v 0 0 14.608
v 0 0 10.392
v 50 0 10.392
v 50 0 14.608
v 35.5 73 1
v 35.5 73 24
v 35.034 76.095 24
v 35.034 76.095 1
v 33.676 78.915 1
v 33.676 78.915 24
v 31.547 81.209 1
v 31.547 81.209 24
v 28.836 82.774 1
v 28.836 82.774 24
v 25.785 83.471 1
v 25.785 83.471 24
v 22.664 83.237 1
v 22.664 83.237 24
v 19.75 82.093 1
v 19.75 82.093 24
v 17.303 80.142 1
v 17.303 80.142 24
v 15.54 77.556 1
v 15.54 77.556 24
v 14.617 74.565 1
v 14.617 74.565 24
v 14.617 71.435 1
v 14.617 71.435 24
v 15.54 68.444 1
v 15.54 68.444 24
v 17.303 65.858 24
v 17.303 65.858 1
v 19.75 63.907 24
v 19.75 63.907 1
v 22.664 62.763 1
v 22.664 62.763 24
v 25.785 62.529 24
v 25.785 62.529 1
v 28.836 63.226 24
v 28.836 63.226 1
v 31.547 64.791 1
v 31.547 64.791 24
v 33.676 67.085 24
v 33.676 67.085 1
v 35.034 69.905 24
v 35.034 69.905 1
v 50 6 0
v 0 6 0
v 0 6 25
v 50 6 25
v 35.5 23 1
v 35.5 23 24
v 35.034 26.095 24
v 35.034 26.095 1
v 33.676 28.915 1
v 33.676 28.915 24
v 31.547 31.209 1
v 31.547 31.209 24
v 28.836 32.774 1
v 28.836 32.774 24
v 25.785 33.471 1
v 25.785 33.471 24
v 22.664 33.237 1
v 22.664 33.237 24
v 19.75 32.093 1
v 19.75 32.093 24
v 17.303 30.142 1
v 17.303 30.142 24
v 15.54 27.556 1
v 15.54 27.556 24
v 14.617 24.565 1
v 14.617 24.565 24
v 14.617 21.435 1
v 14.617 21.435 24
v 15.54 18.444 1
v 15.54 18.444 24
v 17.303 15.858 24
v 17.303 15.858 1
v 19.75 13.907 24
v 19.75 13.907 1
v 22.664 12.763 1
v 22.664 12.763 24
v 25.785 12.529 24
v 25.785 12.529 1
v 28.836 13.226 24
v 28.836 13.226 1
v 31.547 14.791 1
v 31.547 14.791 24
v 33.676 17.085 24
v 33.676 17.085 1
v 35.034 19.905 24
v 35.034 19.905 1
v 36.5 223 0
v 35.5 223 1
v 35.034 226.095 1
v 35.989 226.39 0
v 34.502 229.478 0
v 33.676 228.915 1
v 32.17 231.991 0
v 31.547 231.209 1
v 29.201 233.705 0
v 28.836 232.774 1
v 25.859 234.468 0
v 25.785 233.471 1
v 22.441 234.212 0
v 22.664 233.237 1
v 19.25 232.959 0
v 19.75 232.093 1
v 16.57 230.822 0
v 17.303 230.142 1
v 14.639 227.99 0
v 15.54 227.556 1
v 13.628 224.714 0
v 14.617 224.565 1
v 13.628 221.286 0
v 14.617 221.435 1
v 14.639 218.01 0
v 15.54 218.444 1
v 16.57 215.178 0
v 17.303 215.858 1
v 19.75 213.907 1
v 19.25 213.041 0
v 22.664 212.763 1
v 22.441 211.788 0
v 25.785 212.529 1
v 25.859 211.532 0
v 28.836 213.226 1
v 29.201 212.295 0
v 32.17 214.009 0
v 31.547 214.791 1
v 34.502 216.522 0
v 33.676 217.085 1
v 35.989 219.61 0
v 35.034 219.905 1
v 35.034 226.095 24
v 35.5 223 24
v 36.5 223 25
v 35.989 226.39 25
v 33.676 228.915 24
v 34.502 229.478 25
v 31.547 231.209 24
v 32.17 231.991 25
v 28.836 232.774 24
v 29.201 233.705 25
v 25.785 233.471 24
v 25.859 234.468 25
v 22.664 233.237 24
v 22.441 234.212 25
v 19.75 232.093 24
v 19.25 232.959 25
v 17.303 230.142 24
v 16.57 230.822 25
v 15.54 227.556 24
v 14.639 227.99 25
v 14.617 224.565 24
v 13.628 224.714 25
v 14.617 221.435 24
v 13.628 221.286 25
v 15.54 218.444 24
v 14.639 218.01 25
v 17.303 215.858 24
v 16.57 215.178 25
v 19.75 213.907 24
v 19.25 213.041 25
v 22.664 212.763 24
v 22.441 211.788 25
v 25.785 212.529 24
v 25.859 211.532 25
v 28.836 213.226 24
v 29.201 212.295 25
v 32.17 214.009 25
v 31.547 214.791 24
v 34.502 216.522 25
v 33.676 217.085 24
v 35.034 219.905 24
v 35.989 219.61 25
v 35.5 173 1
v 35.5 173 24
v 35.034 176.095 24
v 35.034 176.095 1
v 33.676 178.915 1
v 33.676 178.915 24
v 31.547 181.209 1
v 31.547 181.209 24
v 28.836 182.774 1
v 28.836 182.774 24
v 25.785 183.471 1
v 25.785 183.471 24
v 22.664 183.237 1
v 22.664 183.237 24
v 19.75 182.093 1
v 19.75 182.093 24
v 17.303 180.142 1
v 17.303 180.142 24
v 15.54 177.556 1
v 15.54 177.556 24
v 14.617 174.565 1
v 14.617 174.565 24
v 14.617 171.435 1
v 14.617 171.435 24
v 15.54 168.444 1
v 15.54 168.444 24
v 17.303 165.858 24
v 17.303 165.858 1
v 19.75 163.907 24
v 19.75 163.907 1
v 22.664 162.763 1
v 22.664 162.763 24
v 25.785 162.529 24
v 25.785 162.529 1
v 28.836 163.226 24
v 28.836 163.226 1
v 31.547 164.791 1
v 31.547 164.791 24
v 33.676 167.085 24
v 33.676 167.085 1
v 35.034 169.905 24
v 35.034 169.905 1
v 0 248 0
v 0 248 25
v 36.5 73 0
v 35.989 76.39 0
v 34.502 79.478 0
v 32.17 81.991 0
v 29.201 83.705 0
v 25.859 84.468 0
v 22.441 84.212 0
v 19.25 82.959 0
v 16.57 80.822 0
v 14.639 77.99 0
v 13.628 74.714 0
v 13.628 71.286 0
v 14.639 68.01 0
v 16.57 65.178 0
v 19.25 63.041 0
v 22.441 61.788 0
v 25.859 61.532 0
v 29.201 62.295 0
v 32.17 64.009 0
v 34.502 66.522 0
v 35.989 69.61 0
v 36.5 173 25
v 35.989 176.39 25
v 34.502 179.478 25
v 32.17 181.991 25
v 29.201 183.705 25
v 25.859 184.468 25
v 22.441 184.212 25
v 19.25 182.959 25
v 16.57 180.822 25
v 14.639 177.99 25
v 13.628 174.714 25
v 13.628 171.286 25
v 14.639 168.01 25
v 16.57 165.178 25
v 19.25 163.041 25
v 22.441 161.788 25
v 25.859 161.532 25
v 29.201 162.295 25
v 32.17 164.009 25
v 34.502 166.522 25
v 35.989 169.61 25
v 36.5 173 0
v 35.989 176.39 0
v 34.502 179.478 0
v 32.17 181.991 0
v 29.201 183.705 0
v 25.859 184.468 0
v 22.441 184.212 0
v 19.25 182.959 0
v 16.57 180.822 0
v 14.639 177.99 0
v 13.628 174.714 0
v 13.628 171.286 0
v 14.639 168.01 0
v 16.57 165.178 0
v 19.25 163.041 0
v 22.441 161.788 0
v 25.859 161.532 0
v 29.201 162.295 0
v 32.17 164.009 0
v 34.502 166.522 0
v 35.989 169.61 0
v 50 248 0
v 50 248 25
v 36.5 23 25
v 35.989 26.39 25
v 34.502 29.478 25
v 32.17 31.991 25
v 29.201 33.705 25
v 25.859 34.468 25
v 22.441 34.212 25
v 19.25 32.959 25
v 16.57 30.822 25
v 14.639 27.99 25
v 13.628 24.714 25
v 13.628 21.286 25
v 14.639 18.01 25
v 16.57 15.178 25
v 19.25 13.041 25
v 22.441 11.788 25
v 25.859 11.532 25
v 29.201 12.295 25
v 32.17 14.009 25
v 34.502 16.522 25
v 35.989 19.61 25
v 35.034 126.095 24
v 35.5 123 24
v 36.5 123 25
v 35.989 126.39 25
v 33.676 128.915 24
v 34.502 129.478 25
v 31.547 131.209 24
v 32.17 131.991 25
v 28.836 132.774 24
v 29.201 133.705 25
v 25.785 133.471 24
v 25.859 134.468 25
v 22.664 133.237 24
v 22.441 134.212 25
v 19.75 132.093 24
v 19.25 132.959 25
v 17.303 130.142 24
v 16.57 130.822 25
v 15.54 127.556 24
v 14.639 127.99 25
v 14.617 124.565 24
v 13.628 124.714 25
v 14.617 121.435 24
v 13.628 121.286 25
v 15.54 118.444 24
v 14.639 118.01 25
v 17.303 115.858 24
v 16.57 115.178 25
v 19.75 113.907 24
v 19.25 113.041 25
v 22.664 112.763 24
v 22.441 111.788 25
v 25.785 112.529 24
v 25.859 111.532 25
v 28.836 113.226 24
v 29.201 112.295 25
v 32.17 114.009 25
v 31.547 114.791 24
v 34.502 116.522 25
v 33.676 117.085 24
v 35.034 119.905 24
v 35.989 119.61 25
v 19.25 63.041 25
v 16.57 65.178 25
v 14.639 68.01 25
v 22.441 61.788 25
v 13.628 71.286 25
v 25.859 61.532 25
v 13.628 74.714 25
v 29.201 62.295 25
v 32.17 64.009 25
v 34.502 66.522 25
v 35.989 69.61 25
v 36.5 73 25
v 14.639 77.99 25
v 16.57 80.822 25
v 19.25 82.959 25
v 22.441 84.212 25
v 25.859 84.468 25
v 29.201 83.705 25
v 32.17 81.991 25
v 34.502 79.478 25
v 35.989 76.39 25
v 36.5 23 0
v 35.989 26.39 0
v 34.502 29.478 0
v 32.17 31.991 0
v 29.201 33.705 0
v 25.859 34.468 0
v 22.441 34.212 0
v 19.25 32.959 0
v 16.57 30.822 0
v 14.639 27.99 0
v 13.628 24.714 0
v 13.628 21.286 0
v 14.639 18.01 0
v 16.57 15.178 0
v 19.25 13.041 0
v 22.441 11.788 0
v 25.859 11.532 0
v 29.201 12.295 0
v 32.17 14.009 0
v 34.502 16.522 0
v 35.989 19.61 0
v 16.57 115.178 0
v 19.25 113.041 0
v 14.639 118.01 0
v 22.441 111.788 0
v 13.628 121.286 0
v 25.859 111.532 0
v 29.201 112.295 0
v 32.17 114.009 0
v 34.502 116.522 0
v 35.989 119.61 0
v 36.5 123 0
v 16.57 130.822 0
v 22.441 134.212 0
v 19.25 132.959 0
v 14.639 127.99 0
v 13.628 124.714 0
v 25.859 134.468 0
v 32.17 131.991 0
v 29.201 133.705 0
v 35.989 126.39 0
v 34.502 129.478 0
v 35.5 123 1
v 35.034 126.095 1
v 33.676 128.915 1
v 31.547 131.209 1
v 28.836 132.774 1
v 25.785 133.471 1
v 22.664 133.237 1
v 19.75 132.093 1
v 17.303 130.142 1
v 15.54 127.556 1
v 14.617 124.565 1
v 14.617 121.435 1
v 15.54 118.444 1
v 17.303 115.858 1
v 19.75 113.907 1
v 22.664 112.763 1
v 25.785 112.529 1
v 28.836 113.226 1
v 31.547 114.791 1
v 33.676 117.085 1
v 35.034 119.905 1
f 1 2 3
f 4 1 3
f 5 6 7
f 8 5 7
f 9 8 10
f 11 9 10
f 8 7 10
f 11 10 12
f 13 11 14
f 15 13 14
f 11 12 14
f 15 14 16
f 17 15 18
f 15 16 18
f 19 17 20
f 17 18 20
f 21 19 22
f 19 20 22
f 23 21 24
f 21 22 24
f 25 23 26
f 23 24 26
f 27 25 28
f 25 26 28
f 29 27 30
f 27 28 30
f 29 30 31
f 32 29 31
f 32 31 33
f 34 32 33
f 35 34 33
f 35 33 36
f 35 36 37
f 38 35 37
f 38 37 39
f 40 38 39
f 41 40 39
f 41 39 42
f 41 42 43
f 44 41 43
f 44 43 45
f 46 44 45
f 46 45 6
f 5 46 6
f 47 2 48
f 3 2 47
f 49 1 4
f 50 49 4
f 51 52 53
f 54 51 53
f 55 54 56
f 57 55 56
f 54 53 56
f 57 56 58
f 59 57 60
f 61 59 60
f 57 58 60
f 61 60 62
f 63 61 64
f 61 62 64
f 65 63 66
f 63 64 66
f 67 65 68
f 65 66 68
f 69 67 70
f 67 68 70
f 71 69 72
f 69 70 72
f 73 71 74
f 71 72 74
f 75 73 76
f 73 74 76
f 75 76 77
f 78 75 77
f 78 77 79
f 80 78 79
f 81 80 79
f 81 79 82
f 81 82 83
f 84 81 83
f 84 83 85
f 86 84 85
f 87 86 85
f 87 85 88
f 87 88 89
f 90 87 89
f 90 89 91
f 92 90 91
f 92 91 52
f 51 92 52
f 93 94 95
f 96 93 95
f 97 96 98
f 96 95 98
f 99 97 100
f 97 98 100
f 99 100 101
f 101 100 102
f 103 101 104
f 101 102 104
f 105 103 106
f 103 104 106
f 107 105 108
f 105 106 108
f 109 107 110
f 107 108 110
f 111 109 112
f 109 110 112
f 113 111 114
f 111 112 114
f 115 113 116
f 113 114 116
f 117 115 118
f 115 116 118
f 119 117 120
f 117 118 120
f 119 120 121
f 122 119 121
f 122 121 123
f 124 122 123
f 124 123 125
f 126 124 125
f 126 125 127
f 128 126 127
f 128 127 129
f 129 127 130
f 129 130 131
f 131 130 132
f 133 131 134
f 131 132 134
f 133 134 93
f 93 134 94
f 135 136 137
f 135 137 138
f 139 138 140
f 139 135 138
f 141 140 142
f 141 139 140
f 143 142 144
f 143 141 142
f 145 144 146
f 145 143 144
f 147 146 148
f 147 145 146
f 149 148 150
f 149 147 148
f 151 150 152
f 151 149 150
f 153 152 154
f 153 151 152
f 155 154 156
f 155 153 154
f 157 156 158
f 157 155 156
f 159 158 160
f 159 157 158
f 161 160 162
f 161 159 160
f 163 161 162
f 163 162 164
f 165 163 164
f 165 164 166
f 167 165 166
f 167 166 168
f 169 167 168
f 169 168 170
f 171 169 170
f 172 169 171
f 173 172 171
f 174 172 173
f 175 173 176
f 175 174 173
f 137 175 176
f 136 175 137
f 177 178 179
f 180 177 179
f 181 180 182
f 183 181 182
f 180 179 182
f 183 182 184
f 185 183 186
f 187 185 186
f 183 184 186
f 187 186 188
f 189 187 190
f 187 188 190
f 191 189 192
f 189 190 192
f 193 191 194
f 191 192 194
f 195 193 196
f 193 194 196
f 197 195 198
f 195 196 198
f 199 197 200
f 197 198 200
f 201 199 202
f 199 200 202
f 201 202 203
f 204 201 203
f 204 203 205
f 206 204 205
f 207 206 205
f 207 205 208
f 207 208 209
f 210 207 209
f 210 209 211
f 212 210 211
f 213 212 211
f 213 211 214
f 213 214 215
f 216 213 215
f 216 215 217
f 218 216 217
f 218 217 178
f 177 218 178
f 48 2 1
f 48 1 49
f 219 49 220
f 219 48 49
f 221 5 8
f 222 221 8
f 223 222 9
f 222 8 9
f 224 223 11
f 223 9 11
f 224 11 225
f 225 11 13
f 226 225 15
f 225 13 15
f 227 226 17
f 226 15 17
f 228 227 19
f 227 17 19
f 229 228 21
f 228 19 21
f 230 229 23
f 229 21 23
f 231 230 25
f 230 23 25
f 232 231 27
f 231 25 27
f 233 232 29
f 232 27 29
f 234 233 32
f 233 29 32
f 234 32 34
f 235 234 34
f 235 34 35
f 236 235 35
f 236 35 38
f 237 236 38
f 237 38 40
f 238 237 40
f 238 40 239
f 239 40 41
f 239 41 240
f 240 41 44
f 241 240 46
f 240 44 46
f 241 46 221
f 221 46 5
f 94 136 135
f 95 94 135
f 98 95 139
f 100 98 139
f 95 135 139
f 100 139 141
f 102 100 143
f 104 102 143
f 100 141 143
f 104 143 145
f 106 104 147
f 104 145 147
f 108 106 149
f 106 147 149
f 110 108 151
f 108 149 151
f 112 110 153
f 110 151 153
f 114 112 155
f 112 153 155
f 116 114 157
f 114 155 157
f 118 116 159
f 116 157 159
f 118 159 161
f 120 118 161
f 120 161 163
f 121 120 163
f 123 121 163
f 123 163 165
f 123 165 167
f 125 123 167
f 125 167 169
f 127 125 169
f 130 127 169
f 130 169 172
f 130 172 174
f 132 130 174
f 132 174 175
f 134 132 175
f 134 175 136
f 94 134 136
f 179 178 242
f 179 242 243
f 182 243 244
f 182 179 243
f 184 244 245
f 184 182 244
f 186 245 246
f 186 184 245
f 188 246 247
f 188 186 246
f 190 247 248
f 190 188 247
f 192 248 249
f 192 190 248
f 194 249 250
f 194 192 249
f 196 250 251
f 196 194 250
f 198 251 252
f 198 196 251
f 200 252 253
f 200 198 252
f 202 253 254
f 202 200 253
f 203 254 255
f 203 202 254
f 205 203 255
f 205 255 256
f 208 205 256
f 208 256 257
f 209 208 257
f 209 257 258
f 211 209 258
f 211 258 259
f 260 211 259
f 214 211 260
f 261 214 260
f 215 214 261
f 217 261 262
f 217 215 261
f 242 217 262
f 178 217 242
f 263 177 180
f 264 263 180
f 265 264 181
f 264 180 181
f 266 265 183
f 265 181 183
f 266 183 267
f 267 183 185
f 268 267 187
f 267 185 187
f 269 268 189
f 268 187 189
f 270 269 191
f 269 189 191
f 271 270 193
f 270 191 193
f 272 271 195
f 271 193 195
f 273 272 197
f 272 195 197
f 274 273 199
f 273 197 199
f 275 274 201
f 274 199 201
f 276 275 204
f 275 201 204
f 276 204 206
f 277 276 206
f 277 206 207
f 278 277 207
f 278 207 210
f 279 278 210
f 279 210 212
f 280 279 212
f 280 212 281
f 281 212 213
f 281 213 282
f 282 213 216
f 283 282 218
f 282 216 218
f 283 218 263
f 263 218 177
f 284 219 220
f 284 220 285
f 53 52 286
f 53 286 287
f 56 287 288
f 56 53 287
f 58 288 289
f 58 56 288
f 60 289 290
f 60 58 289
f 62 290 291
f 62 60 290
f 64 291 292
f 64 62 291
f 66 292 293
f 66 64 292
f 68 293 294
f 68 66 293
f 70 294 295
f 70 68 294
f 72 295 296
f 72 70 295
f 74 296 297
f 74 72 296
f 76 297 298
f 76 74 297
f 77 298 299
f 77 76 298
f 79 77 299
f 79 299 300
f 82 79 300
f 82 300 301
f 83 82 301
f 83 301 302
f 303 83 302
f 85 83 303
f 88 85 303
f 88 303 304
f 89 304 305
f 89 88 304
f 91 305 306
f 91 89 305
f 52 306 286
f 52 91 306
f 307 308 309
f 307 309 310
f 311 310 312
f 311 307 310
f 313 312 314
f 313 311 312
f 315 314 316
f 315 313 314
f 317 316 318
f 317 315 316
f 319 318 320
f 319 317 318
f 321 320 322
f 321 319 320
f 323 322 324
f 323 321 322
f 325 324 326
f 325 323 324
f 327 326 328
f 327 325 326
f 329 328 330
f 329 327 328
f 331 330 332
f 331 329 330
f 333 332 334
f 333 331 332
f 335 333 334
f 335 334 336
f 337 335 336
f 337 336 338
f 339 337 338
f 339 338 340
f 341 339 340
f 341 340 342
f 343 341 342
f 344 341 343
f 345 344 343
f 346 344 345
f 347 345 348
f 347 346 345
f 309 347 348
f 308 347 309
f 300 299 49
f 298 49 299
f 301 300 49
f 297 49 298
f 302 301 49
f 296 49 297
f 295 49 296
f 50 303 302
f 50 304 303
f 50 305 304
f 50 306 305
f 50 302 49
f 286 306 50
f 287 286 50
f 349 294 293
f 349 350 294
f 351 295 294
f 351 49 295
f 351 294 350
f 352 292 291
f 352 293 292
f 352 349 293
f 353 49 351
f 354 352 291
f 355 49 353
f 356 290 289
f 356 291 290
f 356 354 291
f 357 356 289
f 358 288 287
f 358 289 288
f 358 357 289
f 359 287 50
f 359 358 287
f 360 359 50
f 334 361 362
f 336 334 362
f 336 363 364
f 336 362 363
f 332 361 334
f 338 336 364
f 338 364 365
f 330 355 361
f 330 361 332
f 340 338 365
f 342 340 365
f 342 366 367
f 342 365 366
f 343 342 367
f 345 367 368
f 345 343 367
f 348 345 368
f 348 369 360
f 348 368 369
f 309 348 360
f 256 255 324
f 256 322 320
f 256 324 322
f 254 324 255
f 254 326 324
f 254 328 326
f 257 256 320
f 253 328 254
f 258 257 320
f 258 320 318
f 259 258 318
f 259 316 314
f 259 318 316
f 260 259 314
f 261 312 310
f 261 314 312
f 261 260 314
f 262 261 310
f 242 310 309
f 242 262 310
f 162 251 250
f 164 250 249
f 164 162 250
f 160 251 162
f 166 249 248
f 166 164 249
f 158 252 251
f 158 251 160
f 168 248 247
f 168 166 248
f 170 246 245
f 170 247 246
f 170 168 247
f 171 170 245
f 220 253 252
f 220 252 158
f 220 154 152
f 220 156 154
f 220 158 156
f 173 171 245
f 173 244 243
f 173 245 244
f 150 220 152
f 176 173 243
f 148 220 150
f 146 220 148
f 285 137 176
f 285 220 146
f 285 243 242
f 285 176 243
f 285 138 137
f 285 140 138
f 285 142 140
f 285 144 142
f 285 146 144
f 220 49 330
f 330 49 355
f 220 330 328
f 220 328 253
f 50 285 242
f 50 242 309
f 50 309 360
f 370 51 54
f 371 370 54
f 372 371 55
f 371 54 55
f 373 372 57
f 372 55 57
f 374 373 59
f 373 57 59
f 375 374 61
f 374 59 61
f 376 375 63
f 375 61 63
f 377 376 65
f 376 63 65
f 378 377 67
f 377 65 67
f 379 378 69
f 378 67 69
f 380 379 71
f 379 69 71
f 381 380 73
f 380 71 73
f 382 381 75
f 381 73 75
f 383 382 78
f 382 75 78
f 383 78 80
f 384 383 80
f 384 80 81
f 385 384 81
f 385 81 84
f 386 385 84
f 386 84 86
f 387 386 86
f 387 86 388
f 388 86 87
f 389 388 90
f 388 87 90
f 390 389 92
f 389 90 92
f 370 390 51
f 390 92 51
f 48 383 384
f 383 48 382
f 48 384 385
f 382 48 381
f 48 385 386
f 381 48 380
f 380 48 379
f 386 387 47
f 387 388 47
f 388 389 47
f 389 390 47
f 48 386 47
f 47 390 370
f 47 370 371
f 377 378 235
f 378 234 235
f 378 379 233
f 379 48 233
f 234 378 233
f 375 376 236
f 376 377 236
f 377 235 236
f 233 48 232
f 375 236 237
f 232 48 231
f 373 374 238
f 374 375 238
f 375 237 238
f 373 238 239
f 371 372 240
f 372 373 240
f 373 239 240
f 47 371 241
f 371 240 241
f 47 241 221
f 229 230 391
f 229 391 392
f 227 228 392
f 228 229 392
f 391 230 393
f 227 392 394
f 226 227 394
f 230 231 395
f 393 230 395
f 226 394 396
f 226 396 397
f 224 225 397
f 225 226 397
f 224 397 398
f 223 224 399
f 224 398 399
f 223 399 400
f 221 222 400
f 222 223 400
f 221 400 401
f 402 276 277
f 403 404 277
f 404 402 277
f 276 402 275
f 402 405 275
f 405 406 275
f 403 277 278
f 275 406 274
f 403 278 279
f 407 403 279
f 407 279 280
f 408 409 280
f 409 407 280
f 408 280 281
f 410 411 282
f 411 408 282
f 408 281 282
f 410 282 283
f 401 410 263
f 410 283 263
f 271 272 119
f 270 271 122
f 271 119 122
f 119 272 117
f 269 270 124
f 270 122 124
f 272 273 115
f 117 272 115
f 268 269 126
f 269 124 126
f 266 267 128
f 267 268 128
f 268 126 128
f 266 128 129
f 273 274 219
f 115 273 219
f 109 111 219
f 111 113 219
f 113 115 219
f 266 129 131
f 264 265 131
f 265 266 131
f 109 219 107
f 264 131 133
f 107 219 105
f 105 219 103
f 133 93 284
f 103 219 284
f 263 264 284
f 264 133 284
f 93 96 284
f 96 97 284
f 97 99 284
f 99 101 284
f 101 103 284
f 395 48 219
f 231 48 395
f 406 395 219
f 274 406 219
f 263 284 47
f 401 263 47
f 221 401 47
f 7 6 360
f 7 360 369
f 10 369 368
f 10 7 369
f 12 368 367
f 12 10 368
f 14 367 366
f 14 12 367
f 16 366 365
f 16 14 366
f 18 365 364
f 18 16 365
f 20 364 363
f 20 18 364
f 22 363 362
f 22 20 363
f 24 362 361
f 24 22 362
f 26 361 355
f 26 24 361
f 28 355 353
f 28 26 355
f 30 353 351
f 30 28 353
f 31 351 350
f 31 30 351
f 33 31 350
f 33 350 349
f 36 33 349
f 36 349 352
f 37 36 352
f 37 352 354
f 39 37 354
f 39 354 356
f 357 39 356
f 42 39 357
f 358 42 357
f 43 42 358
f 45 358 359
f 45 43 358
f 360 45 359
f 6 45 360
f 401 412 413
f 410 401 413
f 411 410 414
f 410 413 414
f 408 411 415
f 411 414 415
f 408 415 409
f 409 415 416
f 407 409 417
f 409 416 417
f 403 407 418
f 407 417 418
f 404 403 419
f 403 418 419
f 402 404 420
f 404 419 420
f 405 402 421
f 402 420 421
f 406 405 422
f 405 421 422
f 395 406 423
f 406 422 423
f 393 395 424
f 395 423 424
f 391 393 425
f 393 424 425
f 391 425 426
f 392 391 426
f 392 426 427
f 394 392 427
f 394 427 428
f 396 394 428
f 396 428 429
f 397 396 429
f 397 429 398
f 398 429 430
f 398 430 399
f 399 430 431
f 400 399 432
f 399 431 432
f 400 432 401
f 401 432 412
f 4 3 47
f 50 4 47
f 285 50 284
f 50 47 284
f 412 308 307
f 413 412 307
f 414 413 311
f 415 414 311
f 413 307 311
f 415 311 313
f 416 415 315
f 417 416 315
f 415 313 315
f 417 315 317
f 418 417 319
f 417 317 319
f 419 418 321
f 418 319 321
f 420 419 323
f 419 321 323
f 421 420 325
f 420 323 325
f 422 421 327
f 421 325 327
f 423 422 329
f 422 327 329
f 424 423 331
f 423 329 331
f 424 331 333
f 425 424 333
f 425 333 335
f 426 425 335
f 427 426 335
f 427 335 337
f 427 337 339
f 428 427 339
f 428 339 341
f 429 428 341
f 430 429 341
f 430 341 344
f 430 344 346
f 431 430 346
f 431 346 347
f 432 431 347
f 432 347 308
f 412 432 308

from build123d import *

# Parameters (mm, degrees)
SKETCH_1_W          = 50
SKETCH_1_H          = 248
EXTRUDE_1_DEPTH     = 25
SKETCH_2_R          = 10.5
CUT_EXTRUDE_1_DEPTH = 26
CHAMFER_1_SIZE      = 6
CHAMFER_1_SIZE2     = 10.392304845
CHAMFER_2_SIZE      = 6
CHAMFER_2_SIZE2     = 10.392304845
CHAMFER_3_SIZE      = 1


with BuildPart() as part:
    # Эскиз1 → Бобышка-Вытянуть1 (new body)
    with BuildSketch(Plane.XY):
        with Locations((25, 124)):
            Rectangle(SKETCH_1_W, SKETCH_1_H)
    extrude(amount=EXTRUDE_1_DEPTH)

    # Эскиз2 → Вырез-Вытянуть1 (cut, through all)
    with BuildSketch(Plane.XY.offset(25)):
        with Locations((25, 23)):
            Circle(SKETCH_2_R)
        with Locations((25, 73)):
            Circle(SKETCH_2_R)
        with Locations((25, 123)):
            Circle(SKETCH_2_R)
        with Locations((25, 173)):
            Circle(SKETCH_2_R)
        with Locations((25, 223)):
            Circle(SKETCH_2_R)
    extrude(amount=-CUT_EXTRUDE_1_DEPTH, mode=Mode.SUBTRACT)

    # Фаска1
    chamfer_1_edges = [part.edges().sort_by_distance(p)[0] for p in [
        (25, 0, 0),
    ]]
    chamfer_1_side = [part.faces().sort_by_distance(p)[0] for p in [
        (25, 2.529901184, 0),
    ]]
    chamfer(chamfer_1_edges, length=CHAMFER_1_SIZE, length2=CHAMFER_1_SIZE2, reference=chamfer_1_side[0])

    # Фаска2
    chamfer_2_edges = [part.edges().sort_by_distance(p)[0] for p in [
        (25, 0, 25),
    ]]
    chamfer_2_side = [part.faces().sort_by_distance(p)[0] for p in [
        (25, 2.529901184, 25),
    ]]
    chamfer(chamfer_2_edges, length=CHAMFER_2_SIZE, length2=CHAMFER_2_SIZE2, reference=chamfer_2_side[0])

    # Фаска3
    chamfer_3_edges = [part.edges().sort_by_distance(p)[0] for p in [
        (14.5, 23, 0),
        (14.5, 23, 25),
        (14.5, 73, 0),
        (14.5, 73, 25),
        (14.5, 123, 0),
        (14.5, 123, 25),
        (14.5, 173, 0),
        (14.5, 173, 25),
        (14.5, 223, 0),
        (14.5, 223, 25),
    ]]
    chamfer(chamfer_3_edges, length=CHAMFER_3_SIZE)


solid = part.part
